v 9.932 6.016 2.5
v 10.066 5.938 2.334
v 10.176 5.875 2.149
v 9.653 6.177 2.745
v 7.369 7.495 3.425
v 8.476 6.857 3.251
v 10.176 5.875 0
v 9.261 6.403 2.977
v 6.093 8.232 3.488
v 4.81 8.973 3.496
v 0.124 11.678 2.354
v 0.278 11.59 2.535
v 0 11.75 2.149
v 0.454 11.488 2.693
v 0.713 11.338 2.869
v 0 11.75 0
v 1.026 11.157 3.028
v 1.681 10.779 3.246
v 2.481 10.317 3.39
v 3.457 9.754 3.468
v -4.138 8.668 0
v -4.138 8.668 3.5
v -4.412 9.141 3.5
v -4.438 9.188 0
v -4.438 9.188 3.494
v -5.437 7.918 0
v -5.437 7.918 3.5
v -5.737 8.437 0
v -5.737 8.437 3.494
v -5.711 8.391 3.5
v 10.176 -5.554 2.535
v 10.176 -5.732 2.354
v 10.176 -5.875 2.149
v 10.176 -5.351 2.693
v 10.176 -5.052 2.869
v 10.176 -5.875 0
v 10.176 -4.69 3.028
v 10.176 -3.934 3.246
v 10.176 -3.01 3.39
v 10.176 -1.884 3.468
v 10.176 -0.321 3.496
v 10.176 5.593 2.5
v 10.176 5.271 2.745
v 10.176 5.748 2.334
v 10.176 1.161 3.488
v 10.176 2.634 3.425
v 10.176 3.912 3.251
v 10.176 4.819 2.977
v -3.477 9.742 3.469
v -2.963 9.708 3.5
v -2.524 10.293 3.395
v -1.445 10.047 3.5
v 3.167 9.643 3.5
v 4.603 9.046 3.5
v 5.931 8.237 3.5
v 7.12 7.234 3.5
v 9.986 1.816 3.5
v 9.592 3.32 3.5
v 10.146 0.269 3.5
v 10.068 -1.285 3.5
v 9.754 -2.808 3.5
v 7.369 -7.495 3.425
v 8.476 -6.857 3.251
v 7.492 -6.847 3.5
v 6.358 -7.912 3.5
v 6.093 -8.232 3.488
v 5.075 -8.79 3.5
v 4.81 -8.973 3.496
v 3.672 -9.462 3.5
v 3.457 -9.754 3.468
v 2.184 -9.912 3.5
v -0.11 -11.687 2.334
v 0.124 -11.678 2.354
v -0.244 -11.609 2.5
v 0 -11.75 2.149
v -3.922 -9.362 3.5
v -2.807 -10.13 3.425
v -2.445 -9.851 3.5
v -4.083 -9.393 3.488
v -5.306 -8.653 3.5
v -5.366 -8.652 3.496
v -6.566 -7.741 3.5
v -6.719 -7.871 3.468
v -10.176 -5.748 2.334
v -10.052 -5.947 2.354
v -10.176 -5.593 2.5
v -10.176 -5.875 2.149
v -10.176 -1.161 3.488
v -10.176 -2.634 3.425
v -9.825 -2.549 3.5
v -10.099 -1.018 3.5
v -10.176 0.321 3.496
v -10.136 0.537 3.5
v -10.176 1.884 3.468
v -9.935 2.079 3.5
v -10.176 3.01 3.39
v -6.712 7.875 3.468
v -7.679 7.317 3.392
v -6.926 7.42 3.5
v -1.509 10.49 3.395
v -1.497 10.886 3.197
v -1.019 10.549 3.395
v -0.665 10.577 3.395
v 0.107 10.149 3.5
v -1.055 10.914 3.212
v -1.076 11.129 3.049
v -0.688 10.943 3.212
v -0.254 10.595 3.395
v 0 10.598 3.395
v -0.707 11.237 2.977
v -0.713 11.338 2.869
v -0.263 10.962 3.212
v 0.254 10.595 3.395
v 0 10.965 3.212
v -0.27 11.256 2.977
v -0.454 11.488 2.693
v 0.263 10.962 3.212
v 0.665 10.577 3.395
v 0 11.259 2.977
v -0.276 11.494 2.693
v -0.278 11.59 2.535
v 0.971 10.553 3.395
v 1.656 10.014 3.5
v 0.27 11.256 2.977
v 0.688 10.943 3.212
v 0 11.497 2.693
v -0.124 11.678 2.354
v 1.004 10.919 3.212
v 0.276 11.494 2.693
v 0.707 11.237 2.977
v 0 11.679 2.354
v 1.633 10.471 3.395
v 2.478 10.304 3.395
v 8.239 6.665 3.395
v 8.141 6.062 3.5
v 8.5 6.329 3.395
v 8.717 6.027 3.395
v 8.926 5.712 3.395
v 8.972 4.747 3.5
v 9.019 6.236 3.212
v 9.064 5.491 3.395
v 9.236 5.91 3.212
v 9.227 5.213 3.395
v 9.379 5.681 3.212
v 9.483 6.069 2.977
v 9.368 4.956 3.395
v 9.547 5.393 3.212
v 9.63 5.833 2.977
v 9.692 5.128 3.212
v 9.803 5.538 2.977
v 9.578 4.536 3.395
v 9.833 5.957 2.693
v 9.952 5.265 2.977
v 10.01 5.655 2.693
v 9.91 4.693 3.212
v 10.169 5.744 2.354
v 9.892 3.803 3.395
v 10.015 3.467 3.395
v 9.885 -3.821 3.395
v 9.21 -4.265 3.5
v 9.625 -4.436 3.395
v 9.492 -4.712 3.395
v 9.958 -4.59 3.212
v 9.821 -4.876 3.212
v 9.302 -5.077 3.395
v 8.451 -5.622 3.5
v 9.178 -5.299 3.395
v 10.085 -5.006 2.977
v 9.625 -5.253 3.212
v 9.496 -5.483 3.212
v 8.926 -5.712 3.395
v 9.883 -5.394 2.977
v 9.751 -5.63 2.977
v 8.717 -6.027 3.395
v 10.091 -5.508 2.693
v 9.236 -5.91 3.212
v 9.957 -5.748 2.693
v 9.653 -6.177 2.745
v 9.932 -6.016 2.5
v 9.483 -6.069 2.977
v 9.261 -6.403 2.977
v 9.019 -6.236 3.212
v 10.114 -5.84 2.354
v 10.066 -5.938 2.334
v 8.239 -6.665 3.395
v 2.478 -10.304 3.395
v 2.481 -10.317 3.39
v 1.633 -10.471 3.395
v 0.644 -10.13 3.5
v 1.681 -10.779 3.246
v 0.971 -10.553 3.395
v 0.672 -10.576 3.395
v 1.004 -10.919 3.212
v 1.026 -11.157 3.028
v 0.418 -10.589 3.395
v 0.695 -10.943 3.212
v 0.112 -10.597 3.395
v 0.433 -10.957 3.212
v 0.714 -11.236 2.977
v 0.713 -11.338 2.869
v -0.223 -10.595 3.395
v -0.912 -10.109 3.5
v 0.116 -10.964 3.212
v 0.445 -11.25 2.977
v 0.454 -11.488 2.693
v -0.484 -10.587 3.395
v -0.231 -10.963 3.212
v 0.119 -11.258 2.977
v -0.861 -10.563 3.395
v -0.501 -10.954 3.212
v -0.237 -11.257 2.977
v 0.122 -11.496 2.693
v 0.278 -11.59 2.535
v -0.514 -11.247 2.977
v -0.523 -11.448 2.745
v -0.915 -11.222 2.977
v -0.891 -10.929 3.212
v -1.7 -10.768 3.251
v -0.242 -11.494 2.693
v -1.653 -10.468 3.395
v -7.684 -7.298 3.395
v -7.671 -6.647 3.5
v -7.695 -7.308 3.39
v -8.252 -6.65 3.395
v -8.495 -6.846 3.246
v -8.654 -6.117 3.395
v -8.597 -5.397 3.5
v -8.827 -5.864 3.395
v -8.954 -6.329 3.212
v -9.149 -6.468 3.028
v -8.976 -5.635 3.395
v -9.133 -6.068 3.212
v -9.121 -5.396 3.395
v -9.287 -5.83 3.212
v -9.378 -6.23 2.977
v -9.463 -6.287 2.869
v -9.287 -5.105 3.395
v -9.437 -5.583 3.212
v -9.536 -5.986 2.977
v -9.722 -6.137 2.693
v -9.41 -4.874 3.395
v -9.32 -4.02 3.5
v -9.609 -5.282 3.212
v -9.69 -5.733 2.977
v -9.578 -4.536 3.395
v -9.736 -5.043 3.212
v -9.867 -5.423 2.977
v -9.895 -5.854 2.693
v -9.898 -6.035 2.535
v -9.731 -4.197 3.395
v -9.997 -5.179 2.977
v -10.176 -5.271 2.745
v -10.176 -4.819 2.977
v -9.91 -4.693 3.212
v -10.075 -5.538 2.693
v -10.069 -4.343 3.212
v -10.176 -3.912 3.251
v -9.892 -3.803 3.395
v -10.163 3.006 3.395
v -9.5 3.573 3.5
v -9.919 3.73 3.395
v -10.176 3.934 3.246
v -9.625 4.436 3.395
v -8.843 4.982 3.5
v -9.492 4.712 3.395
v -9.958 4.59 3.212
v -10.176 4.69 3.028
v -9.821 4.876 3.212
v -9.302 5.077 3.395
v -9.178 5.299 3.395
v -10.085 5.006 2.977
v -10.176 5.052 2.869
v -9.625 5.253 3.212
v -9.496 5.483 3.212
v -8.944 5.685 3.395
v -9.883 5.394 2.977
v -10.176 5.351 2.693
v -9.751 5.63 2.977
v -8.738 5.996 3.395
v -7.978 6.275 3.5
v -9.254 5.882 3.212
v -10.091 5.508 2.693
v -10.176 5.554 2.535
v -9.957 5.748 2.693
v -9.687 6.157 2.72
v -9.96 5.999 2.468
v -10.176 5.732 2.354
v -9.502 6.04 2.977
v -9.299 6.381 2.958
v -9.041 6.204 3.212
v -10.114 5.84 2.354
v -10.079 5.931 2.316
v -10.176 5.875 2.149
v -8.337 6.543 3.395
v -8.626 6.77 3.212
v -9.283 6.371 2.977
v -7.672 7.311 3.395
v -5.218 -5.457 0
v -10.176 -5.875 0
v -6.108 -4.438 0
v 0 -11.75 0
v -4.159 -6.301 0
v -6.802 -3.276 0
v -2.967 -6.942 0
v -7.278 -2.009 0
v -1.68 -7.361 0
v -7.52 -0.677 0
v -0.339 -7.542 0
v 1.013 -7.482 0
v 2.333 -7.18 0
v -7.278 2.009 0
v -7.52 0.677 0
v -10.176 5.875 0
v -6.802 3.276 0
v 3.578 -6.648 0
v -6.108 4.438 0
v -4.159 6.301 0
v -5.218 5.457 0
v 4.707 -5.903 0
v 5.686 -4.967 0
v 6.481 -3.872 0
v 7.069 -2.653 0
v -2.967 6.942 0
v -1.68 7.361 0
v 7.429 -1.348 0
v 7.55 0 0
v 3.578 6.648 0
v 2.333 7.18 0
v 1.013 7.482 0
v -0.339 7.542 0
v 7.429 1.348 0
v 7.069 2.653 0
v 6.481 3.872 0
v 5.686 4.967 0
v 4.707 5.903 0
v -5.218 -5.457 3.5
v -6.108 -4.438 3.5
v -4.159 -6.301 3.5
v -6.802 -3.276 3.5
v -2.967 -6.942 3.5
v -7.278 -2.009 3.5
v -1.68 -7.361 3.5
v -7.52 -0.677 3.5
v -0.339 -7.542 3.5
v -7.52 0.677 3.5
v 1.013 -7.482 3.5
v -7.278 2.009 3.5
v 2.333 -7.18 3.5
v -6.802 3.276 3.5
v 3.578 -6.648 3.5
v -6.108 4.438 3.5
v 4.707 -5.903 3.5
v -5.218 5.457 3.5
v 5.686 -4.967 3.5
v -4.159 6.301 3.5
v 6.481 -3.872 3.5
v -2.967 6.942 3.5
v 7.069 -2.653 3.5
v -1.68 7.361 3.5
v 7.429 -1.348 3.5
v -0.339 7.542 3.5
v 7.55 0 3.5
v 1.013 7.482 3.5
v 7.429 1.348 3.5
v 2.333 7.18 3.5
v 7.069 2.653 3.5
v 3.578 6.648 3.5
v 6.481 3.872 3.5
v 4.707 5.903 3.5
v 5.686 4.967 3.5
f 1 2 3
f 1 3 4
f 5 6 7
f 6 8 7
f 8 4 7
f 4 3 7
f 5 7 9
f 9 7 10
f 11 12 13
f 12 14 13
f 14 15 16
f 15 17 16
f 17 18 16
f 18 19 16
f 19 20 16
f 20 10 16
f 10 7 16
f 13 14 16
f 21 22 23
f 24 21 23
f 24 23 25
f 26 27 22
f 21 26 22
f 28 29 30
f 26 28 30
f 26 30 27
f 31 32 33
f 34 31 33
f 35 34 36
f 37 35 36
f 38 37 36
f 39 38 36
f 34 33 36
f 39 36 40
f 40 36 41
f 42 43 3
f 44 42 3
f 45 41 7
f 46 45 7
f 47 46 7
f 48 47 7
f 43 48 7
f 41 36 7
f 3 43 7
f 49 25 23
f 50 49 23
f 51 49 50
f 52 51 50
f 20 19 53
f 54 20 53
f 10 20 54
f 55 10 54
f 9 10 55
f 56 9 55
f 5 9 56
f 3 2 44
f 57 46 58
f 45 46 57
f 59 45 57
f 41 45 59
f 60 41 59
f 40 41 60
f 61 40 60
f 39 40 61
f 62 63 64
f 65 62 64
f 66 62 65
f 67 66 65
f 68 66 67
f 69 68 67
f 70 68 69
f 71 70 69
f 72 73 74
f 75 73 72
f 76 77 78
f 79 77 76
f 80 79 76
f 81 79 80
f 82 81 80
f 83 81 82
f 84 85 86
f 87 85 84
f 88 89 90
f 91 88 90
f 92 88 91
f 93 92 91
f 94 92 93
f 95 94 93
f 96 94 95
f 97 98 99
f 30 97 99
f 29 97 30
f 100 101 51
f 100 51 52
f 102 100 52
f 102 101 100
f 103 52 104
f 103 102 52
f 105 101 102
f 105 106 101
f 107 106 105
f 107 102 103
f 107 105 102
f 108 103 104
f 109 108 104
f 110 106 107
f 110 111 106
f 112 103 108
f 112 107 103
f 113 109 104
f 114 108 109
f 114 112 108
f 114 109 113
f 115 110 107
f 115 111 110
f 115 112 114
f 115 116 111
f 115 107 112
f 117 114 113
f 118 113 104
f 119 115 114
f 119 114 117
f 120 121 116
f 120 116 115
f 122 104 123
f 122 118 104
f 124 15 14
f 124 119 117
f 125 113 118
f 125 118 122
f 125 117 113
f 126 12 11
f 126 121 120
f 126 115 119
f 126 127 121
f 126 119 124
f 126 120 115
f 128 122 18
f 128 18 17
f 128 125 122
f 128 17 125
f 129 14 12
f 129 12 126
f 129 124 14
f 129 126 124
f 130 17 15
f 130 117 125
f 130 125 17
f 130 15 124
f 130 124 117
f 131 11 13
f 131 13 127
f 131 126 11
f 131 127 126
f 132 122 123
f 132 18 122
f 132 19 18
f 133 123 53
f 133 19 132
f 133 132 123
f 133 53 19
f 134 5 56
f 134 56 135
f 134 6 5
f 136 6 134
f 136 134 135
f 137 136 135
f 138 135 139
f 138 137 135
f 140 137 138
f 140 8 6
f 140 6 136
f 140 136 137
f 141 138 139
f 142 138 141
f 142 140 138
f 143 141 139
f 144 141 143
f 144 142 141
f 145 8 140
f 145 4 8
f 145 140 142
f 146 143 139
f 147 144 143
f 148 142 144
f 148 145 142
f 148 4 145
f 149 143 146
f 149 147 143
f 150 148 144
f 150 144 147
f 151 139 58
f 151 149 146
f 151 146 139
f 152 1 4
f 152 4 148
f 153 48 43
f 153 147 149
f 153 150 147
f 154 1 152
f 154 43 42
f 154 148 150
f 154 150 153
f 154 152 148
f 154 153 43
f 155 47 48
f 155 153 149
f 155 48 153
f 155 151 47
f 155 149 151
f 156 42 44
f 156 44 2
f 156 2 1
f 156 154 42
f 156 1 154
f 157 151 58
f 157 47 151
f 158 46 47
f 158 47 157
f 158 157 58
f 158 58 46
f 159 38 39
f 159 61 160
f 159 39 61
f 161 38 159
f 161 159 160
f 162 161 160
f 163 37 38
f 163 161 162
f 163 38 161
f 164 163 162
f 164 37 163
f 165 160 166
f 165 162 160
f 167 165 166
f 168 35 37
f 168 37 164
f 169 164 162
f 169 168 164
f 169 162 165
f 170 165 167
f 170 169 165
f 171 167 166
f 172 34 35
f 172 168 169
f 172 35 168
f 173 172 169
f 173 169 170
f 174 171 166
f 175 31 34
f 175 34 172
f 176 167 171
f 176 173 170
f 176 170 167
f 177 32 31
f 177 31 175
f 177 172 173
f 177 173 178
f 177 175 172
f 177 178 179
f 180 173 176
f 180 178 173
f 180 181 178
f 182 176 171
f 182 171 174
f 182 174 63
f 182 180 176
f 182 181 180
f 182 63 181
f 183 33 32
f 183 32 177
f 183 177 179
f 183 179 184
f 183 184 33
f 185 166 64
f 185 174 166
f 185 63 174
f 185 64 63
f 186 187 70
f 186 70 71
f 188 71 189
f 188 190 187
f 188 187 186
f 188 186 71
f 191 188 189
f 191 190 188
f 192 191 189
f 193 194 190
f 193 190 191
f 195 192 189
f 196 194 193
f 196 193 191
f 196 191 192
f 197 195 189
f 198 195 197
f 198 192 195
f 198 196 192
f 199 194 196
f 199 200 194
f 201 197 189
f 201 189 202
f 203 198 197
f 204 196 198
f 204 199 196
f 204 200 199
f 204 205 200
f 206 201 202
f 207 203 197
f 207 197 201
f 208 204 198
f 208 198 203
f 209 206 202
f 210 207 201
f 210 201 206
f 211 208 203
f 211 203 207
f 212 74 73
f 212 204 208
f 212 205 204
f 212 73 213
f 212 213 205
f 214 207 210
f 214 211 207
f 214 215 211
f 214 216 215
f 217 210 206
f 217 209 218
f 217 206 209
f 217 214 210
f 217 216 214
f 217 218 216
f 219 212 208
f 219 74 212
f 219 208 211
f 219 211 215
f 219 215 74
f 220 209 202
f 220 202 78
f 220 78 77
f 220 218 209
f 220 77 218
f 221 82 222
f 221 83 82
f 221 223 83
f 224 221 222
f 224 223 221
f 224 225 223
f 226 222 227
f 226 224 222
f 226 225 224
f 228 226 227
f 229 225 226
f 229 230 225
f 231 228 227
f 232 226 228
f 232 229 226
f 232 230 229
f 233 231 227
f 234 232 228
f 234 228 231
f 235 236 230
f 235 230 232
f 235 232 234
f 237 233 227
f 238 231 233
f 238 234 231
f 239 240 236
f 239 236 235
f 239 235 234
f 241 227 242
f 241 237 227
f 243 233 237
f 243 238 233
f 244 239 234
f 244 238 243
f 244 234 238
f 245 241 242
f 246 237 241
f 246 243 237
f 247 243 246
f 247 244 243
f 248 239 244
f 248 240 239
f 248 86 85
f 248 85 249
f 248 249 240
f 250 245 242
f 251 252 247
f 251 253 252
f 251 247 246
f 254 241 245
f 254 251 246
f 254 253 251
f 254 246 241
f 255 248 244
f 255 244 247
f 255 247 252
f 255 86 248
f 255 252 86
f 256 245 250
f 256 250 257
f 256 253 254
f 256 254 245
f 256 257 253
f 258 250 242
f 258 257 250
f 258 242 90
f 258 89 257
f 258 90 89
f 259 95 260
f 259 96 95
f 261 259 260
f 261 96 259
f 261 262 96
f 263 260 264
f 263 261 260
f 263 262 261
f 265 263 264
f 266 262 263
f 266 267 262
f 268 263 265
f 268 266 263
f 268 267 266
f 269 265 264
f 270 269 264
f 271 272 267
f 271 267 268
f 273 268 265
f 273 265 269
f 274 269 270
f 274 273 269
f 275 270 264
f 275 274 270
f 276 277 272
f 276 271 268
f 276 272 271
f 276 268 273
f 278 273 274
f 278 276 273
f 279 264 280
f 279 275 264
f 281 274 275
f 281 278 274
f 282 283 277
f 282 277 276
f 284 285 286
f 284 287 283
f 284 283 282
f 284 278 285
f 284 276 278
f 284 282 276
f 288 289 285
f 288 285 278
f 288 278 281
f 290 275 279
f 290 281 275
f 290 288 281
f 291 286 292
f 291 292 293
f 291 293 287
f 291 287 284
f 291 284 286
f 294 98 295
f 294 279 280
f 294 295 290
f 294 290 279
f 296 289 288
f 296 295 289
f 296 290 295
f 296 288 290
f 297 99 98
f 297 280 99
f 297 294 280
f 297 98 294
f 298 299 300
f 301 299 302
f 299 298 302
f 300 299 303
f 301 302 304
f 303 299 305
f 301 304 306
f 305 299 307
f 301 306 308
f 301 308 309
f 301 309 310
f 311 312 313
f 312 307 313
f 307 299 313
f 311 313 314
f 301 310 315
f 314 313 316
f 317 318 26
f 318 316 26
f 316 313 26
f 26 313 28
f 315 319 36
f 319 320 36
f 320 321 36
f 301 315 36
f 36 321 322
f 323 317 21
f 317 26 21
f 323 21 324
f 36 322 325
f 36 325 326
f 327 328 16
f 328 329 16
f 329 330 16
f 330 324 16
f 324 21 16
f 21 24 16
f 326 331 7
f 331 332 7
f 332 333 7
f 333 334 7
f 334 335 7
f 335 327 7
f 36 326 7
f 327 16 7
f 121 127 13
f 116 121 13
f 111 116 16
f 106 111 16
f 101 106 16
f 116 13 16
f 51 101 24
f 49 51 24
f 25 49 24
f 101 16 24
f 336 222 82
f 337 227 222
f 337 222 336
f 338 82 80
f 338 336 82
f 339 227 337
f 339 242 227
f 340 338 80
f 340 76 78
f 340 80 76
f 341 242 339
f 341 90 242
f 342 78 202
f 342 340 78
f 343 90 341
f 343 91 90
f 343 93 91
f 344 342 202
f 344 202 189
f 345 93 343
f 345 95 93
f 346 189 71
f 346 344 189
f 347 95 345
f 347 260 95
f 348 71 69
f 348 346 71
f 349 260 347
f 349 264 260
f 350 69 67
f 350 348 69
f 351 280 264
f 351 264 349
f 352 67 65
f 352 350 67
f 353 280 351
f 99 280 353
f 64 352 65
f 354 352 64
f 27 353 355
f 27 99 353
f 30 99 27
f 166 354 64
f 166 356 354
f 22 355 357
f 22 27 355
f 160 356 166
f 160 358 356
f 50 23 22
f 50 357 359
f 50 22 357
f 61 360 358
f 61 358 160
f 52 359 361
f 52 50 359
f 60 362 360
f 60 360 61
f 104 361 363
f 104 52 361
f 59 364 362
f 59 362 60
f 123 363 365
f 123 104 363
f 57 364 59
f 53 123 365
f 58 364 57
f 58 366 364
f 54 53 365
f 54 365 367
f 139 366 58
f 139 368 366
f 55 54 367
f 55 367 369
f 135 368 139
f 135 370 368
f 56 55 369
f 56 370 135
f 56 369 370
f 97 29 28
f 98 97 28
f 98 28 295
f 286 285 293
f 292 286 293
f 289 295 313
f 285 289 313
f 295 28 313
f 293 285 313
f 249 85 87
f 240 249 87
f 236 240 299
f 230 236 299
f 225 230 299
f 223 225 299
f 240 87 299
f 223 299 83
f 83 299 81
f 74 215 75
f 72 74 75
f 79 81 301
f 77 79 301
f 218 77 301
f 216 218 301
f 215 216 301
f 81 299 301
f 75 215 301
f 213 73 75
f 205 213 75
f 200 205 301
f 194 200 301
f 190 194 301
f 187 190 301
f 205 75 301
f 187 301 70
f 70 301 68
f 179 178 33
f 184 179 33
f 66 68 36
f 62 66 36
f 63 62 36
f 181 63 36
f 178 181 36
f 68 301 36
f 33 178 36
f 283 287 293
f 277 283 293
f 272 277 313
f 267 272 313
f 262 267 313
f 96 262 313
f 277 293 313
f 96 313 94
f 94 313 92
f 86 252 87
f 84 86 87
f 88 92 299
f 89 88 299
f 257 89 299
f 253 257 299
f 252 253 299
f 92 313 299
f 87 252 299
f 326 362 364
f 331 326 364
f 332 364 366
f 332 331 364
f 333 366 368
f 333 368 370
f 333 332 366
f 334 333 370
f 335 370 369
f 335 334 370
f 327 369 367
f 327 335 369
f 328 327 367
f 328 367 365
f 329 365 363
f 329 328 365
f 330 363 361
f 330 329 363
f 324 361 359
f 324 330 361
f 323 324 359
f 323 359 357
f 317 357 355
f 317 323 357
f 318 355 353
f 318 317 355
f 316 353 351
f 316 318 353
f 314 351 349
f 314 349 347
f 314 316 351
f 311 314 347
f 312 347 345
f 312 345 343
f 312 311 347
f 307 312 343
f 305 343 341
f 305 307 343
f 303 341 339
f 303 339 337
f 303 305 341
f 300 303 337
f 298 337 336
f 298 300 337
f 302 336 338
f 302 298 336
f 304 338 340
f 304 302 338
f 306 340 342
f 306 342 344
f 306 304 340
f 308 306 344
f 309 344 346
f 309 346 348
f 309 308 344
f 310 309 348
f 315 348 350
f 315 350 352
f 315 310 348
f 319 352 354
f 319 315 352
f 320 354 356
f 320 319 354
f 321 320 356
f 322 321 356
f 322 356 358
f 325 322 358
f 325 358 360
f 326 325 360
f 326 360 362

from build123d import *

# Parameters (mm, degrees)
SKETCH_1_R          = 7.55
EXTRUDE_1_DEPTH     = 3.5
CUT_EXTRUDE_1_DEPTH = 27.5


with BuildPart() as part:
    # Эскиз1 → Бобышка-Вытянуть1 (new body)
    with BuildSketch(Plane.XY):
        Polygon((0, 11.75), (-10.175798494, 5.875), (-10.175798494, -5.875), (0, -11.75), (10.175798494, -5.875), (10.175798494, 5.875), align=None)
        Circle(SKETCH_1_R, mode=Mode.SUBTRACT)
    extrude(amount=EXTRUDE_1_DEPTH)

    # Эскиз3 → Вырез-Повернуть2 (revolve, cut)
    with BuildSketch(Plane(origin=(0, 0, 0), x_dir=(0, 0, -1), z_dir=(1, 0, 0))):
        with BuildLine():
            Line((-2.149262527, 11.75), (-3.5, 11.75))
            Line((-3.5, 11.75), (-3.5, 10.15))
            ThreePointArc((-3.5, 10.15), (-3.06988498, 11.157045866), (-2.149262527, 11.75))
        make_face()
    revolve(axis=Axis((0, 0, 10.349500572), (0, 0, -1)), mode=Mode.SUBTRACT)

    # Эскиз4 → Вырез-Вытянуть1 (cut)
    with BuildSketch(Plane.XY.offset(20)):
        Polygon((-4.438380194, 9.1875), (-5.7374183, 8.4375), (-5.4374183, 7.917884758), (-4.138380194, 8.667884758), align=None)
    extrude(amount=-CUT_EXTRUDE_1_DEPTH, mode=Mode.SUBTRACT)


solid = part.part
